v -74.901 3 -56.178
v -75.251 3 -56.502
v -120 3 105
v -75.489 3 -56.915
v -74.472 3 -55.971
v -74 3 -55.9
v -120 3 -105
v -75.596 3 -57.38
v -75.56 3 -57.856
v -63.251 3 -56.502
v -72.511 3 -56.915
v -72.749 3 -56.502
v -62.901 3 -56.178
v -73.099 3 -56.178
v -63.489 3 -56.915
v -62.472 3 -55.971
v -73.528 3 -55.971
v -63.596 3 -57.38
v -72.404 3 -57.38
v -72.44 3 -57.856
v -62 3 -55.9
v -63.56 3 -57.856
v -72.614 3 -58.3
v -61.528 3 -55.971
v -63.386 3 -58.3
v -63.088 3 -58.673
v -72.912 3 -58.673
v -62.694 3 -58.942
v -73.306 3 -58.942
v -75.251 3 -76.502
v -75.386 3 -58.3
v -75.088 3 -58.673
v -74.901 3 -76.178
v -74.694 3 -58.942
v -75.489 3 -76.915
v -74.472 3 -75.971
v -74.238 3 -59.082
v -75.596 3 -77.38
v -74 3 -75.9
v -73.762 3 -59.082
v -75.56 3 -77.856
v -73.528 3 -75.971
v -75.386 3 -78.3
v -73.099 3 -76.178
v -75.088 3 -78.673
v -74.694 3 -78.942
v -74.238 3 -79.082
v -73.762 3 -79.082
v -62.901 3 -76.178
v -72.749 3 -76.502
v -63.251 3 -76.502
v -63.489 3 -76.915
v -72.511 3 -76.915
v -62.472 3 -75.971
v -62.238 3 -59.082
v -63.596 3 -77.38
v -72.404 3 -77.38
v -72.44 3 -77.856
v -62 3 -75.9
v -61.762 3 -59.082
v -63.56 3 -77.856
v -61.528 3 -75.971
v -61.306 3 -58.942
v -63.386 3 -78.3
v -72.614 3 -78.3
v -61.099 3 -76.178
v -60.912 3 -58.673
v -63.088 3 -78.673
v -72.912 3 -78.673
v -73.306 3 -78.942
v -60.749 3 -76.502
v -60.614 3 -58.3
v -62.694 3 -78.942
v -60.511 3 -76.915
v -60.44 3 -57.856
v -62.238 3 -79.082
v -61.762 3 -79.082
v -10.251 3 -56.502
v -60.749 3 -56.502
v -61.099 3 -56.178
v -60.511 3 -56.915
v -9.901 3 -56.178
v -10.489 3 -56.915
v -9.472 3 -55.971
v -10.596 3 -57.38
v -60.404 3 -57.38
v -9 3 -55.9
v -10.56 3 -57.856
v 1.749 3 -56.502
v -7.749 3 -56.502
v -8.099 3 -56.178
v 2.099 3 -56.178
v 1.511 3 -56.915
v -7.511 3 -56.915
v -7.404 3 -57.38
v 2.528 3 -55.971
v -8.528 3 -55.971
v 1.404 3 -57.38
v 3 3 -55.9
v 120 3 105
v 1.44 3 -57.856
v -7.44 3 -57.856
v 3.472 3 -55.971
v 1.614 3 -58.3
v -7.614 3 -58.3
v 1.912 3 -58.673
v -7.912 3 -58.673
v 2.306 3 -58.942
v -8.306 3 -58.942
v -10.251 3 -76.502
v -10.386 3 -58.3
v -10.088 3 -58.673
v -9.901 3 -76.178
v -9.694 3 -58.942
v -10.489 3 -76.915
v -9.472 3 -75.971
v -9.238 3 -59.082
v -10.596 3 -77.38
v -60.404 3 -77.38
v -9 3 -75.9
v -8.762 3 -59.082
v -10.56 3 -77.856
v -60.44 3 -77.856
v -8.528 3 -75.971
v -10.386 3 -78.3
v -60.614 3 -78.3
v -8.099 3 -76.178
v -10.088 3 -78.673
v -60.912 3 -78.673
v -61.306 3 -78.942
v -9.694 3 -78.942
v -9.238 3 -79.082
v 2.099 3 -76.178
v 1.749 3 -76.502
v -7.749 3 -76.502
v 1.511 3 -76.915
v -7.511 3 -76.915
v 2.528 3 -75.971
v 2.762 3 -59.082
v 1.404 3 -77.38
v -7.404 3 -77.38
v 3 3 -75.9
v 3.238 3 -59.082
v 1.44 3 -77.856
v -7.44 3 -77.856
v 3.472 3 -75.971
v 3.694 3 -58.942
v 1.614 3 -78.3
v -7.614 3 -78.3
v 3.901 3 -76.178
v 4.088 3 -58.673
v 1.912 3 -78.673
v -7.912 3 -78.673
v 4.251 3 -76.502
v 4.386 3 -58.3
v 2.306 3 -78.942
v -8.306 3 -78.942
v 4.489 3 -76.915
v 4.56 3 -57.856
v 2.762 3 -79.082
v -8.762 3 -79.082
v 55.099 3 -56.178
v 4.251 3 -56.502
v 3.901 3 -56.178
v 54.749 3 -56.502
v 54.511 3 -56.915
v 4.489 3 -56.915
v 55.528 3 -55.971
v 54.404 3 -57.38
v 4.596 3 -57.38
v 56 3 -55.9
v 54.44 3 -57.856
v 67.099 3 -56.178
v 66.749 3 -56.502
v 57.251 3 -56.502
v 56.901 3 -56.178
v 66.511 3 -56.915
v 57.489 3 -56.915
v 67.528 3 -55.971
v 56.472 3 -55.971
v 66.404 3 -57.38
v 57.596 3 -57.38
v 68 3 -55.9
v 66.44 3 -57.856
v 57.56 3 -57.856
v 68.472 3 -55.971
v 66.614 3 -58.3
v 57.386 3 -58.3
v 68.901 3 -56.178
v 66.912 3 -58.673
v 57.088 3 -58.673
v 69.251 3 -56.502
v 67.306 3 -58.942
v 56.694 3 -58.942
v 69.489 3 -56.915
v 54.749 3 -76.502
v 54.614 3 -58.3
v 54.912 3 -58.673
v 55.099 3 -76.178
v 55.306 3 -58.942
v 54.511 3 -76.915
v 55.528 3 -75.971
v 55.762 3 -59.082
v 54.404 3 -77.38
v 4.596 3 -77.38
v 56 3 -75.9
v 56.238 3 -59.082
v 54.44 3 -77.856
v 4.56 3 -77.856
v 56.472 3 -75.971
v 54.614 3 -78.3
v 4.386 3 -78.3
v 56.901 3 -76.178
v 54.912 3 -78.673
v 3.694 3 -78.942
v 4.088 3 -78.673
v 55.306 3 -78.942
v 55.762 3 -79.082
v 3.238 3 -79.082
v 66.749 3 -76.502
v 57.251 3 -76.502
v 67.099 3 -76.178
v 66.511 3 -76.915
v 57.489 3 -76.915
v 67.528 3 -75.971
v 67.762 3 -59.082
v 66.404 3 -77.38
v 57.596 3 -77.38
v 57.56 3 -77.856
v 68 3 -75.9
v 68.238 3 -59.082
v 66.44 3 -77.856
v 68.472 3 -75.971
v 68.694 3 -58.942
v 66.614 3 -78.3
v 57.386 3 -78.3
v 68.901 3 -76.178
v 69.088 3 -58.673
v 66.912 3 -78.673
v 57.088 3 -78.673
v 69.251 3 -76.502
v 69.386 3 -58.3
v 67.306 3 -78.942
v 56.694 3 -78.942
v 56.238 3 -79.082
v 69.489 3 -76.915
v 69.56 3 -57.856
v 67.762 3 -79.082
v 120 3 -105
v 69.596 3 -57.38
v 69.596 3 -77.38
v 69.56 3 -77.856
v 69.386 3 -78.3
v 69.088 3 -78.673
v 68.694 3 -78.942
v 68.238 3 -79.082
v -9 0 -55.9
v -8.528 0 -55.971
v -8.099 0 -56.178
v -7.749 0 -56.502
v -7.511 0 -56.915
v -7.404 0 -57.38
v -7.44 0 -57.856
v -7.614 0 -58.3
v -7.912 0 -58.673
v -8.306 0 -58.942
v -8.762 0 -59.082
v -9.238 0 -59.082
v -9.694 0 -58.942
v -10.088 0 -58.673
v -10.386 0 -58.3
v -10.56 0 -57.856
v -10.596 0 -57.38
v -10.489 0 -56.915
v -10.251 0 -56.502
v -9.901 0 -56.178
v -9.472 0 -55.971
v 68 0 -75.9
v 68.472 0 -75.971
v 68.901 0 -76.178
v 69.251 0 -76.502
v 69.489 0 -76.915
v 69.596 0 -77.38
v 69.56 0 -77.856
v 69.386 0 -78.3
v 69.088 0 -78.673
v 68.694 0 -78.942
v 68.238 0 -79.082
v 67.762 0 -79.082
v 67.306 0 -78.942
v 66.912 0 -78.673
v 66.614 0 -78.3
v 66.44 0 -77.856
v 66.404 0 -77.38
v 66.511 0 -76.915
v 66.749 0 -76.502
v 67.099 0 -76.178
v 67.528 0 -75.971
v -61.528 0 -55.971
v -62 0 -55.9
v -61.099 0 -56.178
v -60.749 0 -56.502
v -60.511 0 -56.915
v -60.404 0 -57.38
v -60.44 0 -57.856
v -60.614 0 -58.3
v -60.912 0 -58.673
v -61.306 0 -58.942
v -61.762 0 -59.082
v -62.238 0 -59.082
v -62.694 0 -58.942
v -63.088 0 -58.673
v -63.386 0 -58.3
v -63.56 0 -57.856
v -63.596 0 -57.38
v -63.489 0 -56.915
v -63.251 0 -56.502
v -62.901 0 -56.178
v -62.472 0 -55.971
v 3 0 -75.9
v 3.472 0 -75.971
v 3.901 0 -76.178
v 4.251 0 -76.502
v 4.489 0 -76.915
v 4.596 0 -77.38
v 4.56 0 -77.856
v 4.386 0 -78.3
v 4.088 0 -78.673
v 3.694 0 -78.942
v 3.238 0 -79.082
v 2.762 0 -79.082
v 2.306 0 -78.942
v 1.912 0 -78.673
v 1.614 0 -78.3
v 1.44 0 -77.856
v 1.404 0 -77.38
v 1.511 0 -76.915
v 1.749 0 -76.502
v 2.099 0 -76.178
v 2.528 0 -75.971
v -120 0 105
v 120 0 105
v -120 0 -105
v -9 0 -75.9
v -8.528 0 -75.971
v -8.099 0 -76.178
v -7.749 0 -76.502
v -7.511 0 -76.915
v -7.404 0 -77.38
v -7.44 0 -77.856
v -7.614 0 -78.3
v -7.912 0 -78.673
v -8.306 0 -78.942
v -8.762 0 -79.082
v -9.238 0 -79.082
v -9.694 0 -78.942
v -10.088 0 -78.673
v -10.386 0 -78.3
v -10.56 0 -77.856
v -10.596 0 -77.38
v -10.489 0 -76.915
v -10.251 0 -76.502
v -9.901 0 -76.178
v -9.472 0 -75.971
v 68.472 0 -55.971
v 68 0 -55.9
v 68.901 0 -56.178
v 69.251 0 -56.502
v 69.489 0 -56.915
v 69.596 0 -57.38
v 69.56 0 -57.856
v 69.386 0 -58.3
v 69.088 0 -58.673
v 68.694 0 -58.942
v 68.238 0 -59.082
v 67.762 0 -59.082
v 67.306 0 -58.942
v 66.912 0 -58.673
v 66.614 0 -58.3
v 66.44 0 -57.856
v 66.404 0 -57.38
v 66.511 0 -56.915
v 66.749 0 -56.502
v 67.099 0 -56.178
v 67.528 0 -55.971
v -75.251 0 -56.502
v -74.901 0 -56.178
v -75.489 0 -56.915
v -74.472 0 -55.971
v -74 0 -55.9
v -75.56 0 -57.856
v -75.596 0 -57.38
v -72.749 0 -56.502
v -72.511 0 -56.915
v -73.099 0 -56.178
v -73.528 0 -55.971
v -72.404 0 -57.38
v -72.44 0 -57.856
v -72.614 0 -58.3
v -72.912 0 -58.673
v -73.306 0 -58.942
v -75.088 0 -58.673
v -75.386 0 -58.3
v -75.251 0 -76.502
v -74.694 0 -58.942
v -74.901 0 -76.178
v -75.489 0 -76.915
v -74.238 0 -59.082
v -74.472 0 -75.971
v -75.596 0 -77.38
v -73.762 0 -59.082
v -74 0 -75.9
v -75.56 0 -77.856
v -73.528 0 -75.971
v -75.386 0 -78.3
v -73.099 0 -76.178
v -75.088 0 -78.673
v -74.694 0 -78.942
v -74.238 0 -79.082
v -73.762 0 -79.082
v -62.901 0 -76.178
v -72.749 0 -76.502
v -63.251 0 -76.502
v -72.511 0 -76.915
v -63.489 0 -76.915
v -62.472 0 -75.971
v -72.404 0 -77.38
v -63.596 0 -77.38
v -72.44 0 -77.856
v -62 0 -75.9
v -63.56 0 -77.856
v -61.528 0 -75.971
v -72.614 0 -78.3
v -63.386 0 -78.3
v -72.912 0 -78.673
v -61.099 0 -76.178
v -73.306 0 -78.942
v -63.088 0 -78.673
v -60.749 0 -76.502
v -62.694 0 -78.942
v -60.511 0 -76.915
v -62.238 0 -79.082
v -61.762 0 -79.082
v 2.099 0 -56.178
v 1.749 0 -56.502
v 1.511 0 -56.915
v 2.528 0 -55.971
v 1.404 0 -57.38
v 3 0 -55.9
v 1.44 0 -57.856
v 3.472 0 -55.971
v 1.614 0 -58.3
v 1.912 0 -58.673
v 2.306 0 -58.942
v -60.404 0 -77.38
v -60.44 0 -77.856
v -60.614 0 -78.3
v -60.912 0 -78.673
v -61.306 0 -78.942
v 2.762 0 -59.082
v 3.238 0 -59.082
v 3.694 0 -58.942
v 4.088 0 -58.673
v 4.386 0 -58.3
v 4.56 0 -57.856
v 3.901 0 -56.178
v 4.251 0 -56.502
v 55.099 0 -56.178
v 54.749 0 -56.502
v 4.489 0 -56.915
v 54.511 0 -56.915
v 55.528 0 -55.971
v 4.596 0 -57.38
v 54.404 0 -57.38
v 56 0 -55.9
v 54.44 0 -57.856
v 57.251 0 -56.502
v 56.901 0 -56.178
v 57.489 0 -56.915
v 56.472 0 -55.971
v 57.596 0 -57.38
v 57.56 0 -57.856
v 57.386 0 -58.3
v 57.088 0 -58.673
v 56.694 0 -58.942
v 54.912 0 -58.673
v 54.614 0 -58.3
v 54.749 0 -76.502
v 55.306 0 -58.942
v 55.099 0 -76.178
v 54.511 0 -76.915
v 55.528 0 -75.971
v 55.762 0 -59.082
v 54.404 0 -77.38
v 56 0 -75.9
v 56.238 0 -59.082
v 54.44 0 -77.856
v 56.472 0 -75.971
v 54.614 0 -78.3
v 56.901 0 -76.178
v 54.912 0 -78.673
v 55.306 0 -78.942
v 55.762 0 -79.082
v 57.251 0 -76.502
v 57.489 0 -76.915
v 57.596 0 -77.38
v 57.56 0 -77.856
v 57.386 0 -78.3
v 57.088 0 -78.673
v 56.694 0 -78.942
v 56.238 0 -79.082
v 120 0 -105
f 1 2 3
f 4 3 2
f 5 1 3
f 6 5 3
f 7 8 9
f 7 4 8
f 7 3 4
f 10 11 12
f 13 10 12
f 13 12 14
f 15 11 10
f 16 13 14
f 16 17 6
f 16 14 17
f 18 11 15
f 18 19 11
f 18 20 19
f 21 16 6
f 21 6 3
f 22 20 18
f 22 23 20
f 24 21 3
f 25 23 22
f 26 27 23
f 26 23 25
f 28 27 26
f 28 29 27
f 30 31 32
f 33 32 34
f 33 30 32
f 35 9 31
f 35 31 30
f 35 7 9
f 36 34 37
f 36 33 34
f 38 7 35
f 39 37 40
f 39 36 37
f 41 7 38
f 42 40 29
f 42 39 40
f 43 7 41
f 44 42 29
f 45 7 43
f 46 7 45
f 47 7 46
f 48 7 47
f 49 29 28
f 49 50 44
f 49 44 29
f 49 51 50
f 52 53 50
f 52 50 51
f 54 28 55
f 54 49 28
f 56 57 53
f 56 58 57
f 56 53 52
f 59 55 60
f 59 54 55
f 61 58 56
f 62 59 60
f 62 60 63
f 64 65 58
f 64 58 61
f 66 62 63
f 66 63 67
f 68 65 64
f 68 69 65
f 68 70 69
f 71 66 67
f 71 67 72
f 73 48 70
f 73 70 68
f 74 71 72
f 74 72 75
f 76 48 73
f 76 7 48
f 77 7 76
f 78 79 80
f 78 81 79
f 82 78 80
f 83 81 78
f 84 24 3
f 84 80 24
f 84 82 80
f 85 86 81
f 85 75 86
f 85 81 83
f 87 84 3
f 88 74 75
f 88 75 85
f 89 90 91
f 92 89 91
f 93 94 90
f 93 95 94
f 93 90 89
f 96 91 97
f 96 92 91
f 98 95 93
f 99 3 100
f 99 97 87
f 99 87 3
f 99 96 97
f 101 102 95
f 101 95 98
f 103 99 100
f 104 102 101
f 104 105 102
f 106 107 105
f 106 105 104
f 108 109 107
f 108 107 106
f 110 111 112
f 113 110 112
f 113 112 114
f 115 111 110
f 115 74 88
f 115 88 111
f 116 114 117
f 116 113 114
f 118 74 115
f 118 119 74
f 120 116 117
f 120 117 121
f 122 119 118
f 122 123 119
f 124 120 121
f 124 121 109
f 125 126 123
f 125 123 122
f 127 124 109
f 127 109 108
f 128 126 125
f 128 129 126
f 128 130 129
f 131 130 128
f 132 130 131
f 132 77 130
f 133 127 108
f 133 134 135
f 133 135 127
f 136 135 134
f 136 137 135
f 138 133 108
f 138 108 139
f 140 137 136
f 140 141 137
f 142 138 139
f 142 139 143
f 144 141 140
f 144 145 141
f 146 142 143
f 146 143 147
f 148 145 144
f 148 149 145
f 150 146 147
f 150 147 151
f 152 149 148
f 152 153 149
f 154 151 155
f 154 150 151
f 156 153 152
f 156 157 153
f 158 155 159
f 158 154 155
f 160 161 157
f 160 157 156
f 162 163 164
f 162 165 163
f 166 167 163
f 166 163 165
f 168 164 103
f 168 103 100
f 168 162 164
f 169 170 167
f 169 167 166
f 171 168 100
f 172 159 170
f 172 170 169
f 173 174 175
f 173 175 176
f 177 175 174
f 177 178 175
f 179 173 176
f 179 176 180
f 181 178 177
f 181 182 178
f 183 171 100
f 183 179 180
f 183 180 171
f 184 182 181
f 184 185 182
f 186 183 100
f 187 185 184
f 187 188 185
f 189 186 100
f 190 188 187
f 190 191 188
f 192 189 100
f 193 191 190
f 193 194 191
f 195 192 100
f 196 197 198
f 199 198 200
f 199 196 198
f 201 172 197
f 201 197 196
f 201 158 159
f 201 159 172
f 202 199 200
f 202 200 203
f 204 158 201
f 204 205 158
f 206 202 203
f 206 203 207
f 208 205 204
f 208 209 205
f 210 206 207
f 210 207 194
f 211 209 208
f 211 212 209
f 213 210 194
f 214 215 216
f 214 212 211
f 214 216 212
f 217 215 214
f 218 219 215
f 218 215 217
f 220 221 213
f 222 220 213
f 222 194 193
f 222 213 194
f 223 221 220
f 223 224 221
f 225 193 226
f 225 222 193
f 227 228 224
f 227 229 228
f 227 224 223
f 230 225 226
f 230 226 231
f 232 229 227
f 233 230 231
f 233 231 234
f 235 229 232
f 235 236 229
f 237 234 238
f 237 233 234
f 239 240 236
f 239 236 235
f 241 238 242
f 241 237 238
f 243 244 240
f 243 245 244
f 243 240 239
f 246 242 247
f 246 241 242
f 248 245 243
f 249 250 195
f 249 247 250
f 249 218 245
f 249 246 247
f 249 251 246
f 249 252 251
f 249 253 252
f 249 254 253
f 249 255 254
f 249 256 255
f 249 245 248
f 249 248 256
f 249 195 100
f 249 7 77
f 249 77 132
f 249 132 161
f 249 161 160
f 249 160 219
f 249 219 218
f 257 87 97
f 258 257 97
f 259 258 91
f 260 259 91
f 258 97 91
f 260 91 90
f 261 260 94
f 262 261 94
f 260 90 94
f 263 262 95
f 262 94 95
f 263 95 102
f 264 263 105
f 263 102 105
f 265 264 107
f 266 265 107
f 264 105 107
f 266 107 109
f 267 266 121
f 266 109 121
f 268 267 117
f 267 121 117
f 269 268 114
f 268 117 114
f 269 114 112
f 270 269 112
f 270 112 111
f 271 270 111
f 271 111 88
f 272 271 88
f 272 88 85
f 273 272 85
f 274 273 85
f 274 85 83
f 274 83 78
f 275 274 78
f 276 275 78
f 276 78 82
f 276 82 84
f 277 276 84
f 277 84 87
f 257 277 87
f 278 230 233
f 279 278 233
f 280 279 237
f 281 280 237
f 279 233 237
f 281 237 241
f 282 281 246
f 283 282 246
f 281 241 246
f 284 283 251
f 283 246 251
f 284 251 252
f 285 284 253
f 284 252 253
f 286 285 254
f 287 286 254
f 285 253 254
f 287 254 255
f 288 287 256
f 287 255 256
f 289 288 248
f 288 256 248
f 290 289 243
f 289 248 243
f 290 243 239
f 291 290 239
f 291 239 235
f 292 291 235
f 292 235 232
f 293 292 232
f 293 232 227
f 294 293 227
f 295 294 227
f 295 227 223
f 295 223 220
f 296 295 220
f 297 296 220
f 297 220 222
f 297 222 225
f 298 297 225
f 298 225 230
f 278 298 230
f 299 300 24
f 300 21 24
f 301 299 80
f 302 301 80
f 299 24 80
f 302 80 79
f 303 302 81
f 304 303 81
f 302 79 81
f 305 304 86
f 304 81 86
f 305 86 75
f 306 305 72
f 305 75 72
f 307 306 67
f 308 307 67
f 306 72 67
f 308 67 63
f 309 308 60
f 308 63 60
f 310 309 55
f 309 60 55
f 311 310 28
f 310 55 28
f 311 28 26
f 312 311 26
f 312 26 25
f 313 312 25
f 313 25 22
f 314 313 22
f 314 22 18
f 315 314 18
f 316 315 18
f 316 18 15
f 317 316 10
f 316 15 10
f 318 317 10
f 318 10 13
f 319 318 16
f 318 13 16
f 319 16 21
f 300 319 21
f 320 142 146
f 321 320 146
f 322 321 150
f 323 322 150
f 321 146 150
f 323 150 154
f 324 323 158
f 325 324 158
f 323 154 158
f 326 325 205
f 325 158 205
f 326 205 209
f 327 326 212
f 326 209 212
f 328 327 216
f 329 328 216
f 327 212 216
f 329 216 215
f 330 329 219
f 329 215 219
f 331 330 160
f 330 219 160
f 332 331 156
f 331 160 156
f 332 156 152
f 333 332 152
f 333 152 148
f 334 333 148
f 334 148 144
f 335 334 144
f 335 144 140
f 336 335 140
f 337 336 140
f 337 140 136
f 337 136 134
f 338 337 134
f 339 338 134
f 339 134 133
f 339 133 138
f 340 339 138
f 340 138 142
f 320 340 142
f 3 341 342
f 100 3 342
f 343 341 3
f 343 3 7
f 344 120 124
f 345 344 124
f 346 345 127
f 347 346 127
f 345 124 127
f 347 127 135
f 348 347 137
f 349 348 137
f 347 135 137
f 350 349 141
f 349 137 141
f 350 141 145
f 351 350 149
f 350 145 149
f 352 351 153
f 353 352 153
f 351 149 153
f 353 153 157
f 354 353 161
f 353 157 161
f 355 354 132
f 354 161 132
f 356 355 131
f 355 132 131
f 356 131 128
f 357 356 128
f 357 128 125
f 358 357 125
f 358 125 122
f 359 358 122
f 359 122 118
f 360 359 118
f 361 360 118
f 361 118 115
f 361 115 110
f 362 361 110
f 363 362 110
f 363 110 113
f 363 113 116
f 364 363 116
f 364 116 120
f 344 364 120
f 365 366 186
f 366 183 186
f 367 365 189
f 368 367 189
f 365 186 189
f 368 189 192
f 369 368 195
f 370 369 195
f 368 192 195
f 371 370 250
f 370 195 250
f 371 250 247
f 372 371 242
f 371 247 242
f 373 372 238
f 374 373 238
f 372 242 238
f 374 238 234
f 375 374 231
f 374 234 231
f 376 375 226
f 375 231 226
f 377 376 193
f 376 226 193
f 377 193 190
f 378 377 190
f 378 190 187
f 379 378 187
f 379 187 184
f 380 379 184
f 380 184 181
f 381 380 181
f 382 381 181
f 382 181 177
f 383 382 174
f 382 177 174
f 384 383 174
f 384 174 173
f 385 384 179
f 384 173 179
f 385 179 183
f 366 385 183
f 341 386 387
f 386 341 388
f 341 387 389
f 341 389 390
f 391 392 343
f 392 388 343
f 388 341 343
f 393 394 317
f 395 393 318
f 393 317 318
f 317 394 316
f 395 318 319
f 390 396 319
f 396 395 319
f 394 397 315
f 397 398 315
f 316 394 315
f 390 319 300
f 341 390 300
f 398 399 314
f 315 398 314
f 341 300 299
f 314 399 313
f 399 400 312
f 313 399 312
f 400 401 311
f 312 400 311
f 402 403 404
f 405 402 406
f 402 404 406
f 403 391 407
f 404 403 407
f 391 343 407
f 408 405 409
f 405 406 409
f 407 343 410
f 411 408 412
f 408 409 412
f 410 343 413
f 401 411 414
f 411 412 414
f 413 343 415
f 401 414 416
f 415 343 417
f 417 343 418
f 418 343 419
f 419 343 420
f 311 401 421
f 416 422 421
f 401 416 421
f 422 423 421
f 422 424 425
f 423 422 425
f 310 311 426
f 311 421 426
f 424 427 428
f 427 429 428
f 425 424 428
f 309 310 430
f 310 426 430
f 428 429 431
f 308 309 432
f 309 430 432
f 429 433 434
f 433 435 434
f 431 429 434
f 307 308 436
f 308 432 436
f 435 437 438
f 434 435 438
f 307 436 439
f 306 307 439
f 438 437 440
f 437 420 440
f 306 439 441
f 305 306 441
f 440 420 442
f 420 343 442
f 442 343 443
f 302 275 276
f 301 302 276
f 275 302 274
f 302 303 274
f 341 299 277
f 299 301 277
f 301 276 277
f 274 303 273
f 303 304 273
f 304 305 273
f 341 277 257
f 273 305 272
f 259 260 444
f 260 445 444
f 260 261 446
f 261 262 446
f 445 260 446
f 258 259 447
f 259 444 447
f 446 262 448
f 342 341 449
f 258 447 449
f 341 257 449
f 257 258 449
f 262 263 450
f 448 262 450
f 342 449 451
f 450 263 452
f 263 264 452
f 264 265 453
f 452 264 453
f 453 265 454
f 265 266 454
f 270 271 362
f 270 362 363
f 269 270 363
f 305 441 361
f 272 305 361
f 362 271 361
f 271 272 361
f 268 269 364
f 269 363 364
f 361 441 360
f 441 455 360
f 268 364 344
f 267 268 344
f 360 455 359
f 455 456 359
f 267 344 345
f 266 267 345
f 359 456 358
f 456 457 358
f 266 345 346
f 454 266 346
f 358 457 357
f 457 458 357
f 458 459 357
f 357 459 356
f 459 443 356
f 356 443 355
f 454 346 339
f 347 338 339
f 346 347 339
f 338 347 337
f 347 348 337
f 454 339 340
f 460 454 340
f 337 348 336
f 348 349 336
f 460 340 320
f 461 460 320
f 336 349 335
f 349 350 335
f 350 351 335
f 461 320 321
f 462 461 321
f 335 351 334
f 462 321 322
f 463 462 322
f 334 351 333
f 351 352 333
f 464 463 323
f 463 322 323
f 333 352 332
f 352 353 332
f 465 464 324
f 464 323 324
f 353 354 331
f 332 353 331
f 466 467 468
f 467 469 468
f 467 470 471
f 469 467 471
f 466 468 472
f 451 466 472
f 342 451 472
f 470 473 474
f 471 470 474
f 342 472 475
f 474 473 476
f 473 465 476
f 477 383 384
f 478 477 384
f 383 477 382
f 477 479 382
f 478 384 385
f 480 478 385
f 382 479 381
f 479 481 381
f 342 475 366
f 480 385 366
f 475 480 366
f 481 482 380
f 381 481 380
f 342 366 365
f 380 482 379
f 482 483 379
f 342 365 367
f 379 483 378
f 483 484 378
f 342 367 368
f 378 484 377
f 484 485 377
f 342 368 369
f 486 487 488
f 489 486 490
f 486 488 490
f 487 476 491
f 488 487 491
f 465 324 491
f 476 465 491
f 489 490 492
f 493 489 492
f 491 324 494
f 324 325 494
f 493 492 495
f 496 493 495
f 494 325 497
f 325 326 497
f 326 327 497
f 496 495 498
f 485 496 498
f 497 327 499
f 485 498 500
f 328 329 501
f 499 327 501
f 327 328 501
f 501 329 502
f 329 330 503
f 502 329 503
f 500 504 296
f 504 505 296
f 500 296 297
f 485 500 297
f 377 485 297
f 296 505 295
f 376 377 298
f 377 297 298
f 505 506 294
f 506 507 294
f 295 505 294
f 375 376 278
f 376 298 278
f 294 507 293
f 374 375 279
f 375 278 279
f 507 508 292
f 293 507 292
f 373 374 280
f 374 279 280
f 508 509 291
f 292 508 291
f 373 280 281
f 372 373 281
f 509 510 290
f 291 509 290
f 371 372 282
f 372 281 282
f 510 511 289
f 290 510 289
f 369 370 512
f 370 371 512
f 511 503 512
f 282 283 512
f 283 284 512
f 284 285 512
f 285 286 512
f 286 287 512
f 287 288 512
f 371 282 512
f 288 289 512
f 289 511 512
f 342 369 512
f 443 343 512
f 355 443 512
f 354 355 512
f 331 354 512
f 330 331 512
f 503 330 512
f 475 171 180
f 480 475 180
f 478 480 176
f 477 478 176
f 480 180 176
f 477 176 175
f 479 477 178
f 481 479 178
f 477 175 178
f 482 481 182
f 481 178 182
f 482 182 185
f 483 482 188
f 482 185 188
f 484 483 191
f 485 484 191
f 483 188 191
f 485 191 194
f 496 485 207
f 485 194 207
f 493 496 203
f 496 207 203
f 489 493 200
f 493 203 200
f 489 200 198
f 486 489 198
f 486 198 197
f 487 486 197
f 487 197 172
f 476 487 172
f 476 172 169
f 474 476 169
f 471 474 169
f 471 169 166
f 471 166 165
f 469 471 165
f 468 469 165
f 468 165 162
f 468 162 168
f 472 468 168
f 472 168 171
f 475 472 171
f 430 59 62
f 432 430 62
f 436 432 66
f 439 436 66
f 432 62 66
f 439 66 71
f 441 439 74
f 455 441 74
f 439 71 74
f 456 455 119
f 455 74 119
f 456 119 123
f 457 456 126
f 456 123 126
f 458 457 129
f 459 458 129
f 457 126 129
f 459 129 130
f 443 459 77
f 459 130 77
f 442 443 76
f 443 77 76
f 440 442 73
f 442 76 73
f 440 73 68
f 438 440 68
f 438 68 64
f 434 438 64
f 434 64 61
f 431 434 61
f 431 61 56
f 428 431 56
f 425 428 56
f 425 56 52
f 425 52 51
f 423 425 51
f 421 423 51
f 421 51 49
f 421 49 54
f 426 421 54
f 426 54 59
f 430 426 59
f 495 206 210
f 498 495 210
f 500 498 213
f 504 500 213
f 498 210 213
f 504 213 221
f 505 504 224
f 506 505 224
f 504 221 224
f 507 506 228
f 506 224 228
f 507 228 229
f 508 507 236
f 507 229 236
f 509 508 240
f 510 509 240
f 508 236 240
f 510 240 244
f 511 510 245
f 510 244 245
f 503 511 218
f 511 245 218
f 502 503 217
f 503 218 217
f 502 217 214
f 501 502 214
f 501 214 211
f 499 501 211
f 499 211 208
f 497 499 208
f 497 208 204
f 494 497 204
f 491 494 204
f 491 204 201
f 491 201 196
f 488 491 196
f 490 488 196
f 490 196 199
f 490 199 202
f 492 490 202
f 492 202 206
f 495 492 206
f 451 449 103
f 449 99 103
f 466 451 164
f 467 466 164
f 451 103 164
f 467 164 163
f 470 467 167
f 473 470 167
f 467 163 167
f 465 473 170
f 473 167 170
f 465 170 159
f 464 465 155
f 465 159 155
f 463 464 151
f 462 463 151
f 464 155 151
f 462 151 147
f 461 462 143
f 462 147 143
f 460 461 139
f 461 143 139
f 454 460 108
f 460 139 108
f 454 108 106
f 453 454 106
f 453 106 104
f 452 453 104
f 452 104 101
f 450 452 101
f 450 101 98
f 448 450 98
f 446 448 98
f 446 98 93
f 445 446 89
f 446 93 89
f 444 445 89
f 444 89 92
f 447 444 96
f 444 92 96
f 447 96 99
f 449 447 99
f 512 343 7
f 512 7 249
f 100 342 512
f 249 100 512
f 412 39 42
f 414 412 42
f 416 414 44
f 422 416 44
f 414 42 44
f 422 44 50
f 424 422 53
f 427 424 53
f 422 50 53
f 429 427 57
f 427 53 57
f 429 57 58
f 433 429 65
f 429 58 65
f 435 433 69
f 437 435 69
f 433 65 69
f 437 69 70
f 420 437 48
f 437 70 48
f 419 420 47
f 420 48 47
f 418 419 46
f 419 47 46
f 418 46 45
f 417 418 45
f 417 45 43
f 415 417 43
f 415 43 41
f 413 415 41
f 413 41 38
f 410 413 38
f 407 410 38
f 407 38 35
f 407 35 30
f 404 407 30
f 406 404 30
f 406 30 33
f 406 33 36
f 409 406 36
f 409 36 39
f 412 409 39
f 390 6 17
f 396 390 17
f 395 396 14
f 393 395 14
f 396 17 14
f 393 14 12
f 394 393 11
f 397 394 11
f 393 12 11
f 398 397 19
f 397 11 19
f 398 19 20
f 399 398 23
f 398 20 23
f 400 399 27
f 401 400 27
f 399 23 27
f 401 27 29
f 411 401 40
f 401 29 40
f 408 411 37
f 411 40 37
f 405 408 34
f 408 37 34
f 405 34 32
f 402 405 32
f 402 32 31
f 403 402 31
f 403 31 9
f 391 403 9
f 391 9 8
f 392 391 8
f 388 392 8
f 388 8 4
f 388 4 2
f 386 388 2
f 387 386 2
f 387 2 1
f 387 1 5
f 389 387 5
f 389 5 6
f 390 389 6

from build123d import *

# Parameters (mm, degrees)
SKETCH_1_W             = 240
SKETCH_1_H             = 210
EXTRUDE_1_DEPTH        = 3
SKETCH_2_R             = 1.6
CUT_EXTRUDE_1_DEPTH    = 160.48040632
PATTERN_LINEAR_1_COUNT = 3
PATTERN_LINEAR_1_PITCH = 65


with BuildPart() as part:
    # 草图1 → 凸台-拉伸1 (new body)
    with BuildSketch(Plane(origin=(0, 0, 0), x_dir=(1, 0, 0), z_dir=(0, 1, 0))):
        Rectangle(SKETCH_1_W, SKETCH_1_H)
    extrude(amount=EXTRUDE_1_DEPTH)

    # 草图2 → 切除-拉伸1 (cut, symmetric)
    with BuildSketch(Plane(origin=(0, 3, 0), x_dir=(1, 0, 0), z_dir=(0, 1, 0))):
        with Locations(Location((68, 77.5, 0), (0, 0, 270))):
            Circle(SKETCH_2_R)
        with Locations(Location((56, 77.5, 0), (0, 0, 270))):
            Circle(SKETCH_2_R)
        with Locations(Location((56, 57.5, 0), (0, 0, 270))):
            Circle(SKETCH_2_R)
        with Locations(Location((68, 57.5, 0), (0, 0, 270))):
            Circle(SKETCH_2_R)
    cut_extrude_1 = extrude(amount=CUT_EXTRUDE_1_DEPTH, both=True, mode=Mode.SUBTRACT)

    # 阵列(线性)1: 切除-拉伸1 ×3
    with Locations(*[(-i * PATTERN_LINEAR_1_PITCH, 0, 0) for i in range(1, PATTERN_LINEAR_1_COUNT)]):
        add(cut_extrude_1, mode=Mode.SUBTRACT)


solid = part.part
